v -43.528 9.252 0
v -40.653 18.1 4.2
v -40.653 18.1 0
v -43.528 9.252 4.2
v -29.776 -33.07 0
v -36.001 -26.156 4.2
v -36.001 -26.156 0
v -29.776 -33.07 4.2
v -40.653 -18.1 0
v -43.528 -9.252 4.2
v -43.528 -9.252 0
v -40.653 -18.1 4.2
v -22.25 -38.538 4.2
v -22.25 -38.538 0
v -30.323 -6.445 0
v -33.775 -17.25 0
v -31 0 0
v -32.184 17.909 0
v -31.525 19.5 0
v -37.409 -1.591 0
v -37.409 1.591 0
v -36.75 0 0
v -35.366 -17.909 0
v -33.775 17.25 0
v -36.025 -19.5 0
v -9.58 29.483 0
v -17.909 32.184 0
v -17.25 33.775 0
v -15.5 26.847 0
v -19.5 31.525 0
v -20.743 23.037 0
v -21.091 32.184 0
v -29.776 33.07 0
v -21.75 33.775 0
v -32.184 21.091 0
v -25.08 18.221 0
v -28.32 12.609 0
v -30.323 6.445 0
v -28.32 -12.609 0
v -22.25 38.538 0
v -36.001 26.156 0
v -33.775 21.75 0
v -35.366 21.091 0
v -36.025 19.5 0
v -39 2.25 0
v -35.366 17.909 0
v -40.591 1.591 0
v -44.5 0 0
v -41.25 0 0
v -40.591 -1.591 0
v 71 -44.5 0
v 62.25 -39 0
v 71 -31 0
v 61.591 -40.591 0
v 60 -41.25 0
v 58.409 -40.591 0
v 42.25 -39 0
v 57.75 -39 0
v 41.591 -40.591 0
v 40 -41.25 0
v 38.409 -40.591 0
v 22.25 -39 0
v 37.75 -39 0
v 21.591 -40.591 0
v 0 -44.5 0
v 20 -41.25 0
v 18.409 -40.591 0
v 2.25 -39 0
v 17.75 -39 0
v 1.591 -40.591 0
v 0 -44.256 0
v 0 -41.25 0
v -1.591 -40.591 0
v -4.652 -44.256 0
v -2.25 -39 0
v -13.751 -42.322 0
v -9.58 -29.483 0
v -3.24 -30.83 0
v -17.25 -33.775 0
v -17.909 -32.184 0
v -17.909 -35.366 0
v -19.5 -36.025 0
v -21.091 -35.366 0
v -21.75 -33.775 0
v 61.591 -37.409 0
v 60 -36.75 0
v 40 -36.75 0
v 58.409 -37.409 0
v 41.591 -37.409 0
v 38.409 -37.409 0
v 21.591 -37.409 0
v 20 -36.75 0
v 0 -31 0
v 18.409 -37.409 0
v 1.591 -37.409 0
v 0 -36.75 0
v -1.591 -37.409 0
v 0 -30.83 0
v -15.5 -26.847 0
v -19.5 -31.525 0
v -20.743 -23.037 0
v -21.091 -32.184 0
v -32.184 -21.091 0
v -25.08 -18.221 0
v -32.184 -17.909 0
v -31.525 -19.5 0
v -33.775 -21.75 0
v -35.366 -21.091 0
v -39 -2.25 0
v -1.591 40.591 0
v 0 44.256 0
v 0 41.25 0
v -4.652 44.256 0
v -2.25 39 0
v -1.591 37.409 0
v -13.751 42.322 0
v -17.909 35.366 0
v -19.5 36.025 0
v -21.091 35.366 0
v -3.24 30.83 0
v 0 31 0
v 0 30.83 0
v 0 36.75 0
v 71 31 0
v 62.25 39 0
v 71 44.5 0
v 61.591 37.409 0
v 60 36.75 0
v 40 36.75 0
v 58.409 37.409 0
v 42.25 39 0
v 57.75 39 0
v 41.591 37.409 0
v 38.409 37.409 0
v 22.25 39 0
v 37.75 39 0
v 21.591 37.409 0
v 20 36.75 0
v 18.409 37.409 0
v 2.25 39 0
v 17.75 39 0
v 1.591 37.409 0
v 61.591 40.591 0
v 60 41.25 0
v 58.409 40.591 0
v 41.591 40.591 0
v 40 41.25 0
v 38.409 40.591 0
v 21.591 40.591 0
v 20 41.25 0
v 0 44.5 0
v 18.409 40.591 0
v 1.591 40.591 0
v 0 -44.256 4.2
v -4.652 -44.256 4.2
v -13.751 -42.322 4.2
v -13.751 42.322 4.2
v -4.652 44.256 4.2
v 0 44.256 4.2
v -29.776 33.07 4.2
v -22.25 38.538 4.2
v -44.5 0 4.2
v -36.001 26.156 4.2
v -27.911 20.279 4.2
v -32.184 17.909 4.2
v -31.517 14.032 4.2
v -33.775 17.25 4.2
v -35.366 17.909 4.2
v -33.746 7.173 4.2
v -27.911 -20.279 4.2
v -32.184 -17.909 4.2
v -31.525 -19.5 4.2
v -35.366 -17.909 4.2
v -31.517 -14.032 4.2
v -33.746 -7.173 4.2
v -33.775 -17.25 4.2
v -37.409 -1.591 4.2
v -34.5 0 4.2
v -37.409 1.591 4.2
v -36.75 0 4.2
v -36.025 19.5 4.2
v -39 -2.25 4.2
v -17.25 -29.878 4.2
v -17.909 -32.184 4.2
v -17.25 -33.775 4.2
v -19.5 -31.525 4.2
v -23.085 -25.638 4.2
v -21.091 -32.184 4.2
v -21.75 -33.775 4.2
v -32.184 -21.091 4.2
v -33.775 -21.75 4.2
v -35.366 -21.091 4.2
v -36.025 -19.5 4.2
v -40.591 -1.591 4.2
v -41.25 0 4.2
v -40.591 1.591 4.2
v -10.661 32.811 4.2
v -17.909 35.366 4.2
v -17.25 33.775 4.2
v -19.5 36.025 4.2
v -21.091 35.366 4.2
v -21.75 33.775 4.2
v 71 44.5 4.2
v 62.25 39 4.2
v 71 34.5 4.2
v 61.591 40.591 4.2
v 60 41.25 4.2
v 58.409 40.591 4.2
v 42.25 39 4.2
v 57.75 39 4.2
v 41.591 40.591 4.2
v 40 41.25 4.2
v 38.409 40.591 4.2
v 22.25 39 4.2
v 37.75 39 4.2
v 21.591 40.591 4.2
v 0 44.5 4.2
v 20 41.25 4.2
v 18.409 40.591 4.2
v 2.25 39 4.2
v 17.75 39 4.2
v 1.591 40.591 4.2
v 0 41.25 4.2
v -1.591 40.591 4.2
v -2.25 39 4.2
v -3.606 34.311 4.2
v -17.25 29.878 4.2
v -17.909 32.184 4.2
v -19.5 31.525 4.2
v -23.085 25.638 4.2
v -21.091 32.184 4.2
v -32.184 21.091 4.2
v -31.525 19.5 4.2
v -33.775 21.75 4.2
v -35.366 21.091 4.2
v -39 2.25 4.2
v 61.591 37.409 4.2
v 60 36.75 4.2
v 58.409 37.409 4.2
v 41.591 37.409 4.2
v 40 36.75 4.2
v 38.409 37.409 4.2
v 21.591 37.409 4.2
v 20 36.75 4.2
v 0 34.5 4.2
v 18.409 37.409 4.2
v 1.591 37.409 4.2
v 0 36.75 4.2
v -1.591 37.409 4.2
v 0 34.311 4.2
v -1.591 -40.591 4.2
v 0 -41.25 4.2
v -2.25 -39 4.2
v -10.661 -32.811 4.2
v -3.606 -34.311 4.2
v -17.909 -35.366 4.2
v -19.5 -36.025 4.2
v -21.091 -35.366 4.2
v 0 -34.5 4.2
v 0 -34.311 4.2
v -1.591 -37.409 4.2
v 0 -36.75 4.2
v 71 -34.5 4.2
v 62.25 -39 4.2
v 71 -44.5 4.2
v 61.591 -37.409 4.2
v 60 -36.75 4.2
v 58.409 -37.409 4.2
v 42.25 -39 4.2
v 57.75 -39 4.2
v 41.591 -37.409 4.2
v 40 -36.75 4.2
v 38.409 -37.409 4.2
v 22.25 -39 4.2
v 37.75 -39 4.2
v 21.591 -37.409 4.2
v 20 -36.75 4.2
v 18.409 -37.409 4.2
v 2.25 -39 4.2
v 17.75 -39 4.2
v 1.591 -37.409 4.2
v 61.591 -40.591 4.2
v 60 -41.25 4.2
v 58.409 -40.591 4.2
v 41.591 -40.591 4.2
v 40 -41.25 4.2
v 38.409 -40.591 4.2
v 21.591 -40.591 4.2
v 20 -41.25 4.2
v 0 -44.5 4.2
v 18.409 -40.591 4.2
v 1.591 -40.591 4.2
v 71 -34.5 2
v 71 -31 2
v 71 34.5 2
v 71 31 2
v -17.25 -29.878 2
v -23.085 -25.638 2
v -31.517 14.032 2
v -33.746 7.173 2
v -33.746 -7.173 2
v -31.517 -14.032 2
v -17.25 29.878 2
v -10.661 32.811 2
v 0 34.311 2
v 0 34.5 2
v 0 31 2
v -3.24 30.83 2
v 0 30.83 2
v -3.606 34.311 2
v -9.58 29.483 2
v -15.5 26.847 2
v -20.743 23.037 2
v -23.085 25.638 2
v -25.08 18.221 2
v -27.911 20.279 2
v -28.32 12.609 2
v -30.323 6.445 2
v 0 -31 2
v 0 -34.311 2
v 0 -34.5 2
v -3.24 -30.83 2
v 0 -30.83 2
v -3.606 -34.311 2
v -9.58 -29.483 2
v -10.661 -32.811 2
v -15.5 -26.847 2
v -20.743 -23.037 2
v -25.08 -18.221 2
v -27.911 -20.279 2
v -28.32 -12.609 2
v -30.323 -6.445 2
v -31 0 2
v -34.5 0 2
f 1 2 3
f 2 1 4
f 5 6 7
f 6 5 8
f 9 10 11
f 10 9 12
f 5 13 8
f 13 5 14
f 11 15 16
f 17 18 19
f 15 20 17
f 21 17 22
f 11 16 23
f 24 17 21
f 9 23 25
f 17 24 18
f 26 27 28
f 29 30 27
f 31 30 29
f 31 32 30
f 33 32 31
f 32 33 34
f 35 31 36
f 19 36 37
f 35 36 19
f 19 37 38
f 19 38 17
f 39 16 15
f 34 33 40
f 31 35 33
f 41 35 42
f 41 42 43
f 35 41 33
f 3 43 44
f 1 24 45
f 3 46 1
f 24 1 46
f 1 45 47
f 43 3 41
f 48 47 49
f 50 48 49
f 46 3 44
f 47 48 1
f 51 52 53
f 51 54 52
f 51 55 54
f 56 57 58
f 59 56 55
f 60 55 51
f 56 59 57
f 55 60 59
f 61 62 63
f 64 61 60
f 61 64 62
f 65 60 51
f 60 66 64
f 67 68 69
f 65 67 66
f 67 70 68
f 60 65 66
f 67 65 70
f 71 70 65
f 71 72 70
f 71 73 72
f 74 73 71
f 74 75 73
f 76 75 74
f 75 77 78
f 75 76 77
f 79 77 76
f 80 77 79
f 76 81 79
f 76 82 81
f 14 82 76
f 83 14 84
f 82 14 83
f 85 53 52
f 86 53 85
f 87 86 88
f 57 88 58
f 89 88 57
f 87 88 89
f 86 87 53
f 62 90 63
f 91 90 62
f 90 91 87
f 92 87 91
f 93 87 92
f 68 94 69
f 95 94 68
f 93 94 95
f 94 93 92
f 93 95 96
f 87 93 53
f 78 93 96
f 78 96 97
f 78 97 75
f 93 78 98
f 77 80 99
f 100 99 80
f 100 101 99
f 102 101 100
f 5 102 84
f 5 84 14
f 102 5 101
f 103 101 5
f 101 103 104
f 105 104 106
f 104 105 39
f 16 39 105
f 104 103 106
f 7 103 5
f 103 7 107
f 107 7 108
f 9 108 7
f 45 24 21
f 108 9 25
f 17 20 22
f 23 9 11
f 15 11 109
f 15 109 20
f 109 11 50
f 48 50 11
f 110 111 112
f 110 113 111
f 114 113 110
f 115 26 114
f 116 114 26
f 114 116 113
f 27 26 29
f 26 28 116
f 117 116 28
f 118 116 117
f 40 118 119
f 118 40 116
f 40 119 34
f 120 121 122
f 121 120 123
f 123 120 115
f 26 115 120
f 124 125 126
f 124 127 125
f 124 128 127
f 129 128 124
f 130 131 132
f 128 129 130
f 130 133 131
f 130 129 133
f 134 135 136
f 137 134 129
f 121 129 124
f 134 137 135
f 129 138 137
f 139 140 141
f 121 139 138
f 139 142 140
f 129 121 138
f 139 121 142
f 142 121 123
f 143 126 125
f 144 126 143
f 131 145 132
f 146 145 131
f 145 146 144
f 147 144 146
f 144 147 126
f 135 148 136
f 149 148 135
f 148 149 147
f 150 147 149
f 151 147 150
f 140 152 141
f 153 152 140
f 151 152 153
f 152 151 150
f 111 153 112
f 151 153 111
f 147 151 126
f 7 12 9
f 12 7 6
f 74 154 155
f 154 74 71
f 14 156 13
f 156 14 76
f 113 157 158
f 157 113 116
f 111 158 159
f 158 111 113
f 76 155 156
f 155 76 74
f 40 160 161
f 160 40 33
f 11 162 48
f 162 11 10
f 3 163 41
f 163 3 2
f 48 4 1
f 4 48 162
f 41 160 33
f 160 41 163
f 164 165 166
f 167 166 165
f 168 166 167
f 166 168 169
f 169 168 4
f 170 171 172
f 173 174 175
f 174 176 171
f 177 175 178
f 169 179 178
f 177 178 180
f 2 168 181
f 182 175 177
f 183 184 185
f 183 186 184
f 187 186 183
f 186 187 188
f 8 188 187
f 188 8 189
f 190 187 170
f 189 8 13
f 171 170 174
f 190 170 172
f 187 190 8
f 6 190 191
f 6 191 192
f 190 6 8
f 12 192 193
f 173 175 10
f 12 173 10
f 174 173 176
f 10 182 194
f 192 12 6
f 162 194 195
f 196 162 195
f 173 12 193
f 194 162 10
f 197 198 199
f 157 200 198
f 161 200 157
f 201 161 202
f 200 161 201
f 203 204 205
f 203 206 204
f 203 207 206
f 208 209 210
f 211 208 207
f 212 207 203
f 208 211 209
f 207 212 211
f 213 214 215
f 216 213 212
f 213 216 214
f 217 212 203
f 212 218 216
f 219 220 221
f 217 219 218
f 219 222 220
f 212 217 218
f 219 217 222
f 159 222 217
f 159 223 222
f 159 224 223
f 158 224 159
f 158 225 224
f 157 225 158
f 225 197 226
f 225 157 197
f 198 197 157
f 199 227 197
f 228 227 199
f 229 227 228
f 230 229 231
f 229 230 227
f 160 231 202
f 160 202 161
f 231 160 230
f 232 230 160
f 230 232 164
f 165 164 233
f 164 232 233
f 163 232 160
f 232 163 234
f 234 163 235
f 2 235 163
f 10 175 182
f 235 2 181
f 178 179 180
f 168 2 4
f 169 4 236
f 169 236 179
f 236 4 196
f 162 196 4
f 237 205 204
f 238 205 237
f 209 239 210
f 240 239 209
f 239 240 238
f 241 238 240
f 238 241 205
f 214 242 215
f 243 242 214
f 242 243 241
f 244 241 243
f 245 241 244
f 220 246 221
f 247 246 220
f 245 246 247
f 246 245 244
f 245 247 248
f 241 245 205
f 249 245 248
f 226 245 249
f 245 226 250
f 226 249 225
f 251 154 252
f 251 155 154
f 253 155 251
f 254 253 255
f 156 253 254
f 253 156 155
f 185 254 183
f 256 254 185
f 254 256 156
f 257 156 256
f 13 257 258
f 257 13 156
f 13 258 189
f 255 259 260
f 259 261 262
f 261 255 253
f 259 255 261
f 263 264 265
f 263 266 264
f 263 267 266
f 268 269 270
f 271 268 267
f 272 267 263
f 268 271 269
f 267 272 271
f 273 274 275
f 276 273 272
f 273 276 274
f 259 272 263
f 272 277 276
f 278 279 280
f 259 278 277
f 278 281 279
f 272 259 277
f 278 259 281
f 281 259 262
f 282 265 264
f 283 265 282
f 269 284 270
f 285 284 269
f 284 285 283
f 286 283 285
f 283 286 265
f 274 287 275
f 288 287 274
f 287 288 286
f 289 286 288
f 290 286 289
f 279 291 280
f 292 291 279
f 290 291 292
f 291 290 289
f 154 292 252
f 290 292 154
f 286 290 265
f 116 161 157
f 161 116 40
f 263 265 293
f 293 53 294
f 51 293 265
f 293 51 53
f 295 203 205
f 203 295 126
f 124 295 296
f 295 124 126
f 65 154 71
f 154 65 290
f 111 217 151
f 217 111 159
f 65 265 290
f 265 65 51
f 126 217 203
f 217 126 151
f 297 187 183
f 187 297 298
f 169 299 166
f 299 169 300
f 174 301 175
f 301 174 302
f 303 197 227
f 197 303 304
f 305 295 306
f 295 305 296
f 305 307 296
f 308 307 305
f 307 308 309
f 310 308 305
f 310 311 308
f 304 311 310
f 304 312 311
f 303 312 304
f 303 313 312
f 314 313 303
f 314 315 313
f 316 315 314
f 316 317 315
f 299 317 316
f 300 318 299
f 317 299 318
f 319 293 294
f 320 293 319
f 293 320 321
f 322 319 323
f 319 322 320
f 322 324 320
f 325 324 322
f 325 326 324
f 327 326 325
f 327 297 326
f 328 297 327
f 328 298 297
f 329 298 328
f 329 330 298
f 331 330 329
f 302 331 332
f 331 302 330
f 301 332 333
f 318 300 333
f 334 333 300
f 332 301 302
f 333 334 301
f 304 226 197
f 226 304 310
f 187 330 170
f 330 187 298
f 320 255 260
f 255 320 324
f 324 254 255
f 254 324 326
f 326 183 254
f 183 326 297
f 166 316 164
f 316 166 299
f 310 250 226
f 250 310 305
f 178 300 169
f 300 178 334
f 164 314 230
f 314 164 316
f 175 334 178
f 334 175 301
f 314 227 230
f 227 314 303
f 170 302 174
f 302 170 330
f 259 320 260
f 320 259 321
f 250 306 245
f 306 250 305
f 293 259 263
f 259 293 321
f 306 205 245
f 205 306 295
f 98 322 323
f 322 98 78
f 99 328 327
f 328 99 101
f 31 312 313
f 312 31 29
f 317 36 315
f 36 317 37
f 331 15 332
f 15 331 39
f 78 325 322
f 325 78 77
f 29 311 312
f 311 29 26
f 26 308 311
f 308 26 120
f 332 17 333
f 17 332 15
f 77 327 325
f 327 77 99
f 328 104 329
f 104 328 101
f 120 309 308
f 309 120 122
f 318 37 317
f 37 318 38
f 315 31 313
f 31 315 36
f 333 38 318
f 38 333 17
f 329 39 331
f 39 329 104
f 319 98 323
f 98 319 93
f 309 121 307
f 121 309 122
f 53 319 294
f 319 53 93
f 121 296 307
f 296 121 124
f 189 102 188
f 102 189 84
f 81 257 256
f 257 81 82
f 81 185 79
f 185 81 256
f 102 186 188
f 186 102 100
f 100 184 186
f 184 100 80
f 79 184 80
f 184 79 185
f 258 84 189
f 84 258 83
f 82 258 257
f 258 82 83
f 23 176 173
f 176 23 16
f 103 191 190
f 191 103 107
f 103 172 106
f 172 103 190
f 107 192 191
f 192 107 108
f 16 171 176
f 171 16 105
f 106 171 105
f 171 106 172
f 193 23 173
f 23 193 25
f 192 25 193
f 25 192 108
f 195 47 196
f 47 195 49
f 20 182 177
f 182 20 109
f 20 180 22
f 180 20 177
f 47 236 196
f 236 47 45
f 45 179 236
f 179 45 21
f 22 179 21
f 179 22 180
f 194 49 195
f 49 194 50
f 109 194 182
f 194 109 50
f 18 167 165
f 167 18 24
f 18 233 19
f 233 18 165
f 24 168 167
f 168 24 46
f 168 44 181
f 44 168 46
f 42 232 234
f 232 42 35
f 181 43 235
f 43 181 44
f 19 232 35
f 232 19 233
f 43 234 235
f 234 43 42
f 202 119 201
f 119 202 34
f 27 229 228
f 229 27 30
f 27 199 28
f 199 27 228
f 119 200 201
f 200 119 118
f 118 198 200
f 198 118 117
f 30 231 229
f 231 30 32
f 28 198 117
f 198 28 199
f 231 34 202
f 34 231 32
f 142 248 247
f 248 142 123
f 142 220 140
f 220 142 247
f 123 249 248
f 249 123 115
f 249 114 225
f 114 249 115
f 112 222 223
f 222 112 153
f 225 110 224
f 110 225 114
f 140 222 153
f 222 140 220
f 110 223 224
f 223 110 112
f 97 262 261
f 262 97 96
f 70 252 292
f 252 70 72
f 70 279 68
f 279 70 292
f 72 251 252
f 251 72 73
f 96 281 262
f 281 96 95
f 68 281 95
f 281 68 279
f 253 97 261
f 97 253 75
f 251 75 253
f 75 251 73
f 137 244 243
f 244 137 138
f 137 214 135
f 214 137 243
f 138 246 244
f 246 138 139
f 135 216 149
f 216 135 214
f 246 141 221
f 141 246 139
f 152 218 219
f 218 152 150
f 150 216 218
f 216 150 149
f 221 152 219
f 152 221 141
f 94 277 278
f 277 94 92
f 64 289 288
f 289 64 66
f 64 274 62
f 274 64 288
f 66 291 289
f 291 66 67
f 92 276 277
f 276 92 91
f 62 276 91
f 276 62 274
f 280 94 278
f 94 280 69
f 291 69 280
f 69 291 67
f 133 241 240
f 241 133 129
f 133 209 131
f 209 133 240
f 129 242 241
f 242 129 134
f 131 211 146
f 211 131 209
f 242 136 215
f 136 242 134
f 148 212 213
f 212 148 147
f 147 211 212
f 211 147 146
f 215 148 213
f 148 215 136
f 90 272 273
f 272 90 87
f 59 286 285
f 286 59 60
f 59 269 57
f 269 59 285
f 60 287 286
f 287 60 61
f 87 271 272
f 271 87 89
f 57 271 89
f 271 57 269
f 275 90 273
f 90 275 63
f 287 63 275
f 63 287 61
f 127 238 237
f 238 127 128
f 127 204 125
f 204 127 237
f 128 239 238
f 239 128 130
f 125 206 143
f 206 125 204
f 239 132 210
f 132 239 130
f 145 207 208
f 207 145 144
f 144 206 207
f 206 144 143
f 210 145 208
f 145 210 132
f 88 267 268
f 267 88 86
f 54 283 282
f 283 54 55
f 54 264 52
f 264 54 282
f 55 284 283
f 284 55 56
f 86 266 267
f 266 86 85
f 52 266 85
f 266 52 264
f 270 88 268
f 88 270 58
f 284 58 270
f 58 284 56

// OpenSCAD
thickness = 2.2;
openingWidth = 62;
openingLength = 204;
ridgeWidth = 7;
screwDiameter = 4.5;

module base () {
    outerWidth = openingWidth + 27;
    outerLength = openingLength/2 - openingWidth/2;
    outerThickness = thickness + 2;
    cylinder(h = outerThickness, r = outerWidth/2);
    translate([0, -outerWidth/2, 0])
        cube([outerLength, outerWidth, outerThickness]);
}

module chamfer() {
    chamferWidth = openingWidth + ridgeWidth;
    chamferLength = openingLength;
    chamferThickness = thickness + 0.1;
    cylinder(h = chamferThickness, r = chamferWidth/2);
    translate([0, -chamferWidth/2, 0])
        cube([chamferLength, chamferWidth, chamferThickness]);
    
}

module hole() {
    holeWidth = openingWidth;
    holeLength = openingLength;
    holeThickness = thickness + 5;
    cylinder(h = holeThickness, r = holeWidth/2);
    translate([0, -holeWidth/2, 0])
        cube([holeLength, holeWidth, holeThickness]);
}

module screwHole(x,y) {
    translate([x,y,-0.1])
        cylinder(h = 5, r = screwDiameter / 2);
}

module collar() {
    difference() {
        base();
        translate([0, 0, -0.1])
            chamfer();
        translate([0, 0, -0.1])
            hole();
        for (angle = [-60:30:60]) {
            radius = openingWidth/2 + 8;
            screwHole(-radius*cos(angle), -radius*sin(angle));
        }
        for (x = [0:20:60]) {
            screwHole(x, -(openingWidth/2 + 8));
            screwHole(x, (openingWidth/2 + 8));
        }
    }
}

translate([0, 0, thickness + 2])
    rotate([180, 0, 0])
        collar();
